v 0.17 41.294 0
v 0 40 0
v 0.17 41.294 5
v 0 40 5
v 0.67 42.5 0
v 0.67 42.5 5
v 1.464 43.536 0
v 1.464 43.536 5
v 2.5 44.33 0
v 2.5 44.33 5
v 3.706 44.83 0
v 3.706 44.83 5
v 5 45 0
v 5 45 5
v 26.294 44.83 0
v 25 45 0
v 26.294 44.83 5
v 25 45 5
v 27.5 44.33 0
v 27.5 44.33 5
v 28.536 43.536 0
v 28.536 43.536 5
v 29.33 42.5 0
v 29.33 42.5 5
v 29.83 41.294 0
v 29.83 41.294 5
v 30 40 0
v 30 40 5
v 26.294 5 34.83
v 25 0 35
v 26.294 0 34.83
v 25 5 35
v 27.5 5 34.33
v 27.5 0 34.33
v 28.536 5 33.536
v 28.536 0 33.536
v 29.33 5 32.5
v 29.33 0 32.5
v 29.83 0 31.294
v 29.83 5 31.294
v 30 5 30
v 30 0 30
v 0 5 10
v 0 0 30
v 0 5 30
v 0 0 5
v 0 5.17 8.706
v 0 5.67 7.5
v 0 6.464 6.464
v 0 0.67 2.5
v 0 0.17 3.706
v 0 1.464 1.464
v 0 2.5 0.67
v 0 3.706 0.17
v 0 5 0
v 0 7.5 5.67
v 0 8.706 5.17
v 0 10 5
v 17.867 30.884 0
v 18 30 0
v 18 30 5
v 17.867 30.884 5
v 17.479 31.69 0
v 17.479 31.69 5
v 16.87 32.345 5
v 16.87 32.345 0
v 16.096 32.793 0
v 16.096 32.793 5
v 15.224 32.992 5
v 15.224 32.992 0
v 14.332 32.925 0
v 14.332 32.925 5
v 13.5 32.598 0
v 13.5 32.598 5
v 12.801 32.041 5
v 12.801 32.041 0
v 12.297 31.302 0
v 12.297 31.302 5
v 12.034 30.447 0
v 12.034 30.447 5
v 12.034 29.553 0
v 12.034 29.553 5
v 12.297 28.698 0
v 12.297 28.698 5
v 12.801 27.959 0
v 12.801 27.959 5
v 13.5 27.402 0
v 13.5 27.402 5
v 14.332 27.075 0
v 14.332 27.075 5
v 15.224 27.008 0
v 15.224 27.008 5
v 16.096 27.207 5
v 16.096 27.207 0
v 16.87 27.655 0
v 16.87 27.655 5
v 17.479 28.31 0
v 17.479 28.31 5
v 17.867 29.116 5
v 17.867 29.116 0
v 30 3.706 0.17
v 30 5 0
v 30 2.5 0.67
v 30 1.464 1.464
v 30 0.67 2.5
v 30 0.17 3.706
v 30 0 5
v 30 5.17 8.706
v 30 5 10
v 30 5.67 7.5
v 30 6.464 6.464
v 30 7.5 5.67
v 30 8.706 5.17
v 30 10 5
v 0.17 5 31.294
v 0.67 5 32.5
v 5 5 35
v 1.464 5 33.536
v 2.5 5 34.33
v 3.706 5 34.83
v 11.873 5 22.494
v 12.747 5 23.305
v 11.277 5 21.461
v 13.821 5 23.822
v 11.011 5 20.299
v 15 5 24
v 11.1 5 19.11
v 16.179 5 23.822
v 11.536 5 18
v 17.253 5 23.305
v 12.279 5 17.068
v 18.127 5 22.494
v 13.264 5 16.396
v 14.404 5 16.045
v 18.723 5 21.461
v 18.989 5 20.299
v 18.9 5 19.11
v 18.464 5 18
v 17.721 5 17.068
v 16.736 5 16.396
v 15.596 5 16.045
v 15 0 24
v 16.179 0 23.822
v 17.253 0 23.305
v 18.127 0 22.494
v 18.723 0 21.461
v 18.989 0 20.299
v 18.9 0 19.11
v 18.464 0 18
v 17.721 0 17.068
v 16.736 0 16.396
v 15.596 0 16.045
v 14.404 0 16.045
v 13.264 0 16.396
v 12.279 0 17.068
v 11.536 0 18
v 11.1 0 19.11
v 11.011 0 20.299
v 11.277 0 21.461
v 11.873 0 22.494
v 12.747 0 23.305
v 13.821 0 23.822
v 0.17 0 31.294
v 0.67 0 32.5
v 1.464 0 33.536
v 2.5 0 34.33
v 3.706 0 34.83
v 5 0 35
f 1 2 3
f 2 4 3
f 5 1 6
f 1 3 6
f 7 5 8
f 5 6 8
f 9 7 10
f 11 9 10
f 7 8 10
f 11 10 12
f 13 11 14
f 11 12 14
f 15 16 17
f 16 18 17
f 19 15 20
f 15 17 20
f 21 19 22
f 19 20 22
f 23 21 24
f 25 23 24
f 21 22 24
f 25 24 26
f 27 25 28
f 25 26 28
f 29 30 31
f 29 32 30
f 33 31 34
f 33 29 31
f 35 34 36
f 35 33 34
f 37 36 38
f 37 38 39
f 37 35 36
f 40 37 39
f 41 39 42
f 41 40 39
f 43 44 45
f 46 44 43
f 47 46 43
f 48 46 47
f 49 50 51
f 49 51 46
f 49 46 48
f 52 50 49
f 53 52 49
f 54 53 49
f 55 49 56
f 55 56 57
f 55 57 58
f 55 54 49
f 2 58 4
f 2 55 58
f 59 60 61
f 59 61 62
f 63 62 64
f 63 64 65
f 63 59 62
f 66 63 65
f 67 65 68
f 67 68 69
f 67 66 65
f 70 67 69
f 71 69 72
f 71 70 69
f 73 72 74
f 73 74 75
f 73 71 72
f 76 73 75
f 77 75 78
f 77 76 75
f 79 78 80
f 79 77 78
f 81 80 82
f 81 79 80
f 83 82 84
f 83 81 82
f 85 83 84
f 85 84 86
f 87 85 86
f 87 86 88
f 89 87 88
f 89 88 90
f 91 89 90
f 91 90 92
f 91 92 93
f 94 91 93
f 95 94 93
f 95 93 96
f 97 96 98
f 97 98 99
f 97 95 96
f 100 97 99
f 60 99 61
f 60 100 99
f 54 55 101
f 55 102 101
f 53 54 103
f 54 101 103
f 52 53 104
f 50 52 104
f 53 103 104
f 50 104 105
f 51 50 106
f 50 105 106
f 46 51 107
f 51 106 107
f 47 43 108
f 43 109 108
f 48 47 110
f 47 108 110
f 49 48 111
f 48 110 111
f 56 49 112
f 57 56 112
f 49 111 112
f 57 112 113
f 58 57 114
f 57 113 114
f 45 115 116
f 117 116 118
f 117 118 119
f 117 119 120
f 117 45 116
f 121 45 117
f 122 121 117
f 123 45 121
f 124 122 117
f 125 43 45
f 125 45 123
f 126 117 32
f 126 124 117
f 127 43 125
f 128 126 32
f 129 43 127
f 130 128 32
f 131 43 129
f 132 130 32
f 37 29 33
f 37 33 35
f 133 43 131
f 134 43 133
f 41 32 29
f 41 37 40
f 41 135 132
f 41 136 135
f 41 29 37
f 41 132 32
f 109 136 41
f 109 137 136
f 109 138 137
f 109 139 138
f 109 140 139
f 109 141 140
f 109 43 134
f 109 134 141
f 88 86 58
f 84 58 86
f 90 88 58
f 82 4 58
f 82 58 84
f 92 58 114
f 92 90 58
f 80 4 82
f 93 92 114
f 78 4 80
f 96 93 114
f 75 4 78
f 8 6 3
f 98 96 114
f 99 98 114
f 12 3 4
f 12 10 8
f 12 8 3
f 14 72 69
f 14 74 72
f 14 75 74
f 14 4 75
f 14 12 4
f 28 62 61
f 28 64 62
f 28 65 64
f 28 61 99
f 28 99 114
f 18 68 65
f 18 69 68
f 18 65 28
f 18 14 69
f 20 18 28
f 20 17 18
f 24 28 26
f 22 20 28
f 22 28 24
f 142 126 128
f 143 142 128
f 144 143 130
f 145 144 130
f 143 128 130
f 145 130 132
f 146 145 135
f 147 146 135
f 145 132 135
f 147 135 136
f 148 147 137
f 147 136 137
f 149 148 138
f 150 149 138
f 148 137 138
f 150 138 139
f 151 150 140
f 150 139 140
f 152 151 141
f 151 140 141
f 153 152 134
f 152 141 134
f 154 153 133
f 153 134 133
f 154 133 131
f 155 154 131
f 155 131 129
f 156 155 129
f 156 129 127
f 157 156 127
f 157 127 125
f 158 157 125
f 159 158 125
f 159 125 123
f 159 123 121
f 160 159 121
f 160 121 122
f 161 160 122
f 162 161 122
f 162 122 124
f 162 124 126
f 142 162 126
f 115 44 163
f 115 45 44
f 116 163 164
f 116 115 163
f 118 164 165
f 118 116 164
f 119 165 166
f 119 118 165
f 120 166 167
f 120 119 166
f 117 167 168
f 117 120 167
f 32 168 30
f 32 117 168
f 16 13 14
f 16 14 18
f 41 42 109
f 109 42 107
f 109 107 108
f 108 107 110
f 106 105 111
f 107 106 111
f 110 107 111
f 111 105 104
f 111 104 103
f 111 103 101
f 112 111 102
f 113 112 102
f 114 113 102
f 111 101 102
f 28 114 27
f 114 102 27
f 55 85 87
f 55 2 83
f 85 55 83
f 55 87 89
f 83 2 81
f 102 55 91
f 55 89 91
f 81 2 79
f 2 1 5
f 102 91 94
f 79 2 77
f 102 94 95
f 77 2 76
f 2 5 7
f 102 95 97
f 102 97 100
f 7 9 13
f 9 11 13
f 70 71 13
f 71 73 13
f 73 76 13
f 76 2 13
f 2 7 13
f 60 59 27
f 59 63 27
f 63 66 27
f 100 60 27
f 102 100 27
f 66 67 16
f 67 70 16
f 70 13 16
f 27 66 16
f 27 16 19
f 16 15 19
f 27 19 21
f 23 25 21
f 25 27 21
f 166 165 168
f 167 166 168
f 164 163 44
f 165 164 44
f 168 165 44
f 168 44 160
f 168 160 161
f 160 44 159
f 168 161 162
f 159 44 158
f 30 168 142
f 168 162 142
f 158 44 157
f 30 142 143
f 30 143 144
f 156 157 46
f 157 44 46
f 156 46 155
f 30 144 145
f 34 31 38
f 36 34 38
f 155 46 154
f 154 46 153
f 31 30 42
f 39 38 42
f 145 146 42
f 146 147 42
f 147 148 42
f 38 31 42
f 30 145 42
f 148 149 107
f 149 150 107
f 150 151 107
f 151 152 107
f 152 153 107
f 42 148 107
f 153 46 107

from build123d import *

# Parameters (mm, degrees)
SKETCH1_W           = 30
SKETCH1_H           = 45
SKETCH1_R           = 3
BOSS_EXTRUDE1_DEPTH = 5
SKETCH2_W           = 30
SKETCH2_H           = 5
BOSS_EXTRUDE2_DEPTH = 30
SKETCH3_R           = 4
CUT_EXTRUDE1_DEPTH  = 30
FILLET1_R           = 5


with BuildPart() as part:
    # Sketch1 → Boss-Extrude1 (new body)
    with BuildSketch(Plane.XY):
        with Locations((15, 22.5)):
            Rectangle(SKETCH1_W, SKETCH1_H)
        with Locations((15, 30)):
            Circle(SKETCH1_R, mode=Mode.SUBTRACT)
    extrude(amount=BOSS_EXTRUDE1_DEPTH)

    # Sketch2 → Boss-Extrude2 (add)
    with BuildSketch(Plane.XY.offset(5)):
        with Locations((15, 2.5)):
            Rectangle(SKETCH2_W, SKETCH2_H)
    extrude(amount=BOSS_EXTRUDE2_DEPTH)

    # Sketch3 → Cut-Extrude1 (cut)
    with BuildSketch(Plane(origin=(0, 5, 0), x_dir=(1, 0, 0), z_dir=(0, 1, 0))):
        with Locations(Location((15, -20, 0), (0, 0, 270))):
            Circle(SKETCH3_R)
    extrude(amount=-CUT_EXTRUDE1_DEPTH, mode=Mode.SUBTRACT)

    # Fillet1
    fillet1_edges = [part.edges().sort_by_distance(p)[0] for p in [
        (15, 5, 5),
        (0, 2.5, 35),
        (30, 2.5, 35),
        (15, 0, 0),
        (0, 45, 2.5),
        (30, 45, 2.5),
    ]]
    fillet(fillet1_edges, radius=FILLET1_R)


solid = part.part
